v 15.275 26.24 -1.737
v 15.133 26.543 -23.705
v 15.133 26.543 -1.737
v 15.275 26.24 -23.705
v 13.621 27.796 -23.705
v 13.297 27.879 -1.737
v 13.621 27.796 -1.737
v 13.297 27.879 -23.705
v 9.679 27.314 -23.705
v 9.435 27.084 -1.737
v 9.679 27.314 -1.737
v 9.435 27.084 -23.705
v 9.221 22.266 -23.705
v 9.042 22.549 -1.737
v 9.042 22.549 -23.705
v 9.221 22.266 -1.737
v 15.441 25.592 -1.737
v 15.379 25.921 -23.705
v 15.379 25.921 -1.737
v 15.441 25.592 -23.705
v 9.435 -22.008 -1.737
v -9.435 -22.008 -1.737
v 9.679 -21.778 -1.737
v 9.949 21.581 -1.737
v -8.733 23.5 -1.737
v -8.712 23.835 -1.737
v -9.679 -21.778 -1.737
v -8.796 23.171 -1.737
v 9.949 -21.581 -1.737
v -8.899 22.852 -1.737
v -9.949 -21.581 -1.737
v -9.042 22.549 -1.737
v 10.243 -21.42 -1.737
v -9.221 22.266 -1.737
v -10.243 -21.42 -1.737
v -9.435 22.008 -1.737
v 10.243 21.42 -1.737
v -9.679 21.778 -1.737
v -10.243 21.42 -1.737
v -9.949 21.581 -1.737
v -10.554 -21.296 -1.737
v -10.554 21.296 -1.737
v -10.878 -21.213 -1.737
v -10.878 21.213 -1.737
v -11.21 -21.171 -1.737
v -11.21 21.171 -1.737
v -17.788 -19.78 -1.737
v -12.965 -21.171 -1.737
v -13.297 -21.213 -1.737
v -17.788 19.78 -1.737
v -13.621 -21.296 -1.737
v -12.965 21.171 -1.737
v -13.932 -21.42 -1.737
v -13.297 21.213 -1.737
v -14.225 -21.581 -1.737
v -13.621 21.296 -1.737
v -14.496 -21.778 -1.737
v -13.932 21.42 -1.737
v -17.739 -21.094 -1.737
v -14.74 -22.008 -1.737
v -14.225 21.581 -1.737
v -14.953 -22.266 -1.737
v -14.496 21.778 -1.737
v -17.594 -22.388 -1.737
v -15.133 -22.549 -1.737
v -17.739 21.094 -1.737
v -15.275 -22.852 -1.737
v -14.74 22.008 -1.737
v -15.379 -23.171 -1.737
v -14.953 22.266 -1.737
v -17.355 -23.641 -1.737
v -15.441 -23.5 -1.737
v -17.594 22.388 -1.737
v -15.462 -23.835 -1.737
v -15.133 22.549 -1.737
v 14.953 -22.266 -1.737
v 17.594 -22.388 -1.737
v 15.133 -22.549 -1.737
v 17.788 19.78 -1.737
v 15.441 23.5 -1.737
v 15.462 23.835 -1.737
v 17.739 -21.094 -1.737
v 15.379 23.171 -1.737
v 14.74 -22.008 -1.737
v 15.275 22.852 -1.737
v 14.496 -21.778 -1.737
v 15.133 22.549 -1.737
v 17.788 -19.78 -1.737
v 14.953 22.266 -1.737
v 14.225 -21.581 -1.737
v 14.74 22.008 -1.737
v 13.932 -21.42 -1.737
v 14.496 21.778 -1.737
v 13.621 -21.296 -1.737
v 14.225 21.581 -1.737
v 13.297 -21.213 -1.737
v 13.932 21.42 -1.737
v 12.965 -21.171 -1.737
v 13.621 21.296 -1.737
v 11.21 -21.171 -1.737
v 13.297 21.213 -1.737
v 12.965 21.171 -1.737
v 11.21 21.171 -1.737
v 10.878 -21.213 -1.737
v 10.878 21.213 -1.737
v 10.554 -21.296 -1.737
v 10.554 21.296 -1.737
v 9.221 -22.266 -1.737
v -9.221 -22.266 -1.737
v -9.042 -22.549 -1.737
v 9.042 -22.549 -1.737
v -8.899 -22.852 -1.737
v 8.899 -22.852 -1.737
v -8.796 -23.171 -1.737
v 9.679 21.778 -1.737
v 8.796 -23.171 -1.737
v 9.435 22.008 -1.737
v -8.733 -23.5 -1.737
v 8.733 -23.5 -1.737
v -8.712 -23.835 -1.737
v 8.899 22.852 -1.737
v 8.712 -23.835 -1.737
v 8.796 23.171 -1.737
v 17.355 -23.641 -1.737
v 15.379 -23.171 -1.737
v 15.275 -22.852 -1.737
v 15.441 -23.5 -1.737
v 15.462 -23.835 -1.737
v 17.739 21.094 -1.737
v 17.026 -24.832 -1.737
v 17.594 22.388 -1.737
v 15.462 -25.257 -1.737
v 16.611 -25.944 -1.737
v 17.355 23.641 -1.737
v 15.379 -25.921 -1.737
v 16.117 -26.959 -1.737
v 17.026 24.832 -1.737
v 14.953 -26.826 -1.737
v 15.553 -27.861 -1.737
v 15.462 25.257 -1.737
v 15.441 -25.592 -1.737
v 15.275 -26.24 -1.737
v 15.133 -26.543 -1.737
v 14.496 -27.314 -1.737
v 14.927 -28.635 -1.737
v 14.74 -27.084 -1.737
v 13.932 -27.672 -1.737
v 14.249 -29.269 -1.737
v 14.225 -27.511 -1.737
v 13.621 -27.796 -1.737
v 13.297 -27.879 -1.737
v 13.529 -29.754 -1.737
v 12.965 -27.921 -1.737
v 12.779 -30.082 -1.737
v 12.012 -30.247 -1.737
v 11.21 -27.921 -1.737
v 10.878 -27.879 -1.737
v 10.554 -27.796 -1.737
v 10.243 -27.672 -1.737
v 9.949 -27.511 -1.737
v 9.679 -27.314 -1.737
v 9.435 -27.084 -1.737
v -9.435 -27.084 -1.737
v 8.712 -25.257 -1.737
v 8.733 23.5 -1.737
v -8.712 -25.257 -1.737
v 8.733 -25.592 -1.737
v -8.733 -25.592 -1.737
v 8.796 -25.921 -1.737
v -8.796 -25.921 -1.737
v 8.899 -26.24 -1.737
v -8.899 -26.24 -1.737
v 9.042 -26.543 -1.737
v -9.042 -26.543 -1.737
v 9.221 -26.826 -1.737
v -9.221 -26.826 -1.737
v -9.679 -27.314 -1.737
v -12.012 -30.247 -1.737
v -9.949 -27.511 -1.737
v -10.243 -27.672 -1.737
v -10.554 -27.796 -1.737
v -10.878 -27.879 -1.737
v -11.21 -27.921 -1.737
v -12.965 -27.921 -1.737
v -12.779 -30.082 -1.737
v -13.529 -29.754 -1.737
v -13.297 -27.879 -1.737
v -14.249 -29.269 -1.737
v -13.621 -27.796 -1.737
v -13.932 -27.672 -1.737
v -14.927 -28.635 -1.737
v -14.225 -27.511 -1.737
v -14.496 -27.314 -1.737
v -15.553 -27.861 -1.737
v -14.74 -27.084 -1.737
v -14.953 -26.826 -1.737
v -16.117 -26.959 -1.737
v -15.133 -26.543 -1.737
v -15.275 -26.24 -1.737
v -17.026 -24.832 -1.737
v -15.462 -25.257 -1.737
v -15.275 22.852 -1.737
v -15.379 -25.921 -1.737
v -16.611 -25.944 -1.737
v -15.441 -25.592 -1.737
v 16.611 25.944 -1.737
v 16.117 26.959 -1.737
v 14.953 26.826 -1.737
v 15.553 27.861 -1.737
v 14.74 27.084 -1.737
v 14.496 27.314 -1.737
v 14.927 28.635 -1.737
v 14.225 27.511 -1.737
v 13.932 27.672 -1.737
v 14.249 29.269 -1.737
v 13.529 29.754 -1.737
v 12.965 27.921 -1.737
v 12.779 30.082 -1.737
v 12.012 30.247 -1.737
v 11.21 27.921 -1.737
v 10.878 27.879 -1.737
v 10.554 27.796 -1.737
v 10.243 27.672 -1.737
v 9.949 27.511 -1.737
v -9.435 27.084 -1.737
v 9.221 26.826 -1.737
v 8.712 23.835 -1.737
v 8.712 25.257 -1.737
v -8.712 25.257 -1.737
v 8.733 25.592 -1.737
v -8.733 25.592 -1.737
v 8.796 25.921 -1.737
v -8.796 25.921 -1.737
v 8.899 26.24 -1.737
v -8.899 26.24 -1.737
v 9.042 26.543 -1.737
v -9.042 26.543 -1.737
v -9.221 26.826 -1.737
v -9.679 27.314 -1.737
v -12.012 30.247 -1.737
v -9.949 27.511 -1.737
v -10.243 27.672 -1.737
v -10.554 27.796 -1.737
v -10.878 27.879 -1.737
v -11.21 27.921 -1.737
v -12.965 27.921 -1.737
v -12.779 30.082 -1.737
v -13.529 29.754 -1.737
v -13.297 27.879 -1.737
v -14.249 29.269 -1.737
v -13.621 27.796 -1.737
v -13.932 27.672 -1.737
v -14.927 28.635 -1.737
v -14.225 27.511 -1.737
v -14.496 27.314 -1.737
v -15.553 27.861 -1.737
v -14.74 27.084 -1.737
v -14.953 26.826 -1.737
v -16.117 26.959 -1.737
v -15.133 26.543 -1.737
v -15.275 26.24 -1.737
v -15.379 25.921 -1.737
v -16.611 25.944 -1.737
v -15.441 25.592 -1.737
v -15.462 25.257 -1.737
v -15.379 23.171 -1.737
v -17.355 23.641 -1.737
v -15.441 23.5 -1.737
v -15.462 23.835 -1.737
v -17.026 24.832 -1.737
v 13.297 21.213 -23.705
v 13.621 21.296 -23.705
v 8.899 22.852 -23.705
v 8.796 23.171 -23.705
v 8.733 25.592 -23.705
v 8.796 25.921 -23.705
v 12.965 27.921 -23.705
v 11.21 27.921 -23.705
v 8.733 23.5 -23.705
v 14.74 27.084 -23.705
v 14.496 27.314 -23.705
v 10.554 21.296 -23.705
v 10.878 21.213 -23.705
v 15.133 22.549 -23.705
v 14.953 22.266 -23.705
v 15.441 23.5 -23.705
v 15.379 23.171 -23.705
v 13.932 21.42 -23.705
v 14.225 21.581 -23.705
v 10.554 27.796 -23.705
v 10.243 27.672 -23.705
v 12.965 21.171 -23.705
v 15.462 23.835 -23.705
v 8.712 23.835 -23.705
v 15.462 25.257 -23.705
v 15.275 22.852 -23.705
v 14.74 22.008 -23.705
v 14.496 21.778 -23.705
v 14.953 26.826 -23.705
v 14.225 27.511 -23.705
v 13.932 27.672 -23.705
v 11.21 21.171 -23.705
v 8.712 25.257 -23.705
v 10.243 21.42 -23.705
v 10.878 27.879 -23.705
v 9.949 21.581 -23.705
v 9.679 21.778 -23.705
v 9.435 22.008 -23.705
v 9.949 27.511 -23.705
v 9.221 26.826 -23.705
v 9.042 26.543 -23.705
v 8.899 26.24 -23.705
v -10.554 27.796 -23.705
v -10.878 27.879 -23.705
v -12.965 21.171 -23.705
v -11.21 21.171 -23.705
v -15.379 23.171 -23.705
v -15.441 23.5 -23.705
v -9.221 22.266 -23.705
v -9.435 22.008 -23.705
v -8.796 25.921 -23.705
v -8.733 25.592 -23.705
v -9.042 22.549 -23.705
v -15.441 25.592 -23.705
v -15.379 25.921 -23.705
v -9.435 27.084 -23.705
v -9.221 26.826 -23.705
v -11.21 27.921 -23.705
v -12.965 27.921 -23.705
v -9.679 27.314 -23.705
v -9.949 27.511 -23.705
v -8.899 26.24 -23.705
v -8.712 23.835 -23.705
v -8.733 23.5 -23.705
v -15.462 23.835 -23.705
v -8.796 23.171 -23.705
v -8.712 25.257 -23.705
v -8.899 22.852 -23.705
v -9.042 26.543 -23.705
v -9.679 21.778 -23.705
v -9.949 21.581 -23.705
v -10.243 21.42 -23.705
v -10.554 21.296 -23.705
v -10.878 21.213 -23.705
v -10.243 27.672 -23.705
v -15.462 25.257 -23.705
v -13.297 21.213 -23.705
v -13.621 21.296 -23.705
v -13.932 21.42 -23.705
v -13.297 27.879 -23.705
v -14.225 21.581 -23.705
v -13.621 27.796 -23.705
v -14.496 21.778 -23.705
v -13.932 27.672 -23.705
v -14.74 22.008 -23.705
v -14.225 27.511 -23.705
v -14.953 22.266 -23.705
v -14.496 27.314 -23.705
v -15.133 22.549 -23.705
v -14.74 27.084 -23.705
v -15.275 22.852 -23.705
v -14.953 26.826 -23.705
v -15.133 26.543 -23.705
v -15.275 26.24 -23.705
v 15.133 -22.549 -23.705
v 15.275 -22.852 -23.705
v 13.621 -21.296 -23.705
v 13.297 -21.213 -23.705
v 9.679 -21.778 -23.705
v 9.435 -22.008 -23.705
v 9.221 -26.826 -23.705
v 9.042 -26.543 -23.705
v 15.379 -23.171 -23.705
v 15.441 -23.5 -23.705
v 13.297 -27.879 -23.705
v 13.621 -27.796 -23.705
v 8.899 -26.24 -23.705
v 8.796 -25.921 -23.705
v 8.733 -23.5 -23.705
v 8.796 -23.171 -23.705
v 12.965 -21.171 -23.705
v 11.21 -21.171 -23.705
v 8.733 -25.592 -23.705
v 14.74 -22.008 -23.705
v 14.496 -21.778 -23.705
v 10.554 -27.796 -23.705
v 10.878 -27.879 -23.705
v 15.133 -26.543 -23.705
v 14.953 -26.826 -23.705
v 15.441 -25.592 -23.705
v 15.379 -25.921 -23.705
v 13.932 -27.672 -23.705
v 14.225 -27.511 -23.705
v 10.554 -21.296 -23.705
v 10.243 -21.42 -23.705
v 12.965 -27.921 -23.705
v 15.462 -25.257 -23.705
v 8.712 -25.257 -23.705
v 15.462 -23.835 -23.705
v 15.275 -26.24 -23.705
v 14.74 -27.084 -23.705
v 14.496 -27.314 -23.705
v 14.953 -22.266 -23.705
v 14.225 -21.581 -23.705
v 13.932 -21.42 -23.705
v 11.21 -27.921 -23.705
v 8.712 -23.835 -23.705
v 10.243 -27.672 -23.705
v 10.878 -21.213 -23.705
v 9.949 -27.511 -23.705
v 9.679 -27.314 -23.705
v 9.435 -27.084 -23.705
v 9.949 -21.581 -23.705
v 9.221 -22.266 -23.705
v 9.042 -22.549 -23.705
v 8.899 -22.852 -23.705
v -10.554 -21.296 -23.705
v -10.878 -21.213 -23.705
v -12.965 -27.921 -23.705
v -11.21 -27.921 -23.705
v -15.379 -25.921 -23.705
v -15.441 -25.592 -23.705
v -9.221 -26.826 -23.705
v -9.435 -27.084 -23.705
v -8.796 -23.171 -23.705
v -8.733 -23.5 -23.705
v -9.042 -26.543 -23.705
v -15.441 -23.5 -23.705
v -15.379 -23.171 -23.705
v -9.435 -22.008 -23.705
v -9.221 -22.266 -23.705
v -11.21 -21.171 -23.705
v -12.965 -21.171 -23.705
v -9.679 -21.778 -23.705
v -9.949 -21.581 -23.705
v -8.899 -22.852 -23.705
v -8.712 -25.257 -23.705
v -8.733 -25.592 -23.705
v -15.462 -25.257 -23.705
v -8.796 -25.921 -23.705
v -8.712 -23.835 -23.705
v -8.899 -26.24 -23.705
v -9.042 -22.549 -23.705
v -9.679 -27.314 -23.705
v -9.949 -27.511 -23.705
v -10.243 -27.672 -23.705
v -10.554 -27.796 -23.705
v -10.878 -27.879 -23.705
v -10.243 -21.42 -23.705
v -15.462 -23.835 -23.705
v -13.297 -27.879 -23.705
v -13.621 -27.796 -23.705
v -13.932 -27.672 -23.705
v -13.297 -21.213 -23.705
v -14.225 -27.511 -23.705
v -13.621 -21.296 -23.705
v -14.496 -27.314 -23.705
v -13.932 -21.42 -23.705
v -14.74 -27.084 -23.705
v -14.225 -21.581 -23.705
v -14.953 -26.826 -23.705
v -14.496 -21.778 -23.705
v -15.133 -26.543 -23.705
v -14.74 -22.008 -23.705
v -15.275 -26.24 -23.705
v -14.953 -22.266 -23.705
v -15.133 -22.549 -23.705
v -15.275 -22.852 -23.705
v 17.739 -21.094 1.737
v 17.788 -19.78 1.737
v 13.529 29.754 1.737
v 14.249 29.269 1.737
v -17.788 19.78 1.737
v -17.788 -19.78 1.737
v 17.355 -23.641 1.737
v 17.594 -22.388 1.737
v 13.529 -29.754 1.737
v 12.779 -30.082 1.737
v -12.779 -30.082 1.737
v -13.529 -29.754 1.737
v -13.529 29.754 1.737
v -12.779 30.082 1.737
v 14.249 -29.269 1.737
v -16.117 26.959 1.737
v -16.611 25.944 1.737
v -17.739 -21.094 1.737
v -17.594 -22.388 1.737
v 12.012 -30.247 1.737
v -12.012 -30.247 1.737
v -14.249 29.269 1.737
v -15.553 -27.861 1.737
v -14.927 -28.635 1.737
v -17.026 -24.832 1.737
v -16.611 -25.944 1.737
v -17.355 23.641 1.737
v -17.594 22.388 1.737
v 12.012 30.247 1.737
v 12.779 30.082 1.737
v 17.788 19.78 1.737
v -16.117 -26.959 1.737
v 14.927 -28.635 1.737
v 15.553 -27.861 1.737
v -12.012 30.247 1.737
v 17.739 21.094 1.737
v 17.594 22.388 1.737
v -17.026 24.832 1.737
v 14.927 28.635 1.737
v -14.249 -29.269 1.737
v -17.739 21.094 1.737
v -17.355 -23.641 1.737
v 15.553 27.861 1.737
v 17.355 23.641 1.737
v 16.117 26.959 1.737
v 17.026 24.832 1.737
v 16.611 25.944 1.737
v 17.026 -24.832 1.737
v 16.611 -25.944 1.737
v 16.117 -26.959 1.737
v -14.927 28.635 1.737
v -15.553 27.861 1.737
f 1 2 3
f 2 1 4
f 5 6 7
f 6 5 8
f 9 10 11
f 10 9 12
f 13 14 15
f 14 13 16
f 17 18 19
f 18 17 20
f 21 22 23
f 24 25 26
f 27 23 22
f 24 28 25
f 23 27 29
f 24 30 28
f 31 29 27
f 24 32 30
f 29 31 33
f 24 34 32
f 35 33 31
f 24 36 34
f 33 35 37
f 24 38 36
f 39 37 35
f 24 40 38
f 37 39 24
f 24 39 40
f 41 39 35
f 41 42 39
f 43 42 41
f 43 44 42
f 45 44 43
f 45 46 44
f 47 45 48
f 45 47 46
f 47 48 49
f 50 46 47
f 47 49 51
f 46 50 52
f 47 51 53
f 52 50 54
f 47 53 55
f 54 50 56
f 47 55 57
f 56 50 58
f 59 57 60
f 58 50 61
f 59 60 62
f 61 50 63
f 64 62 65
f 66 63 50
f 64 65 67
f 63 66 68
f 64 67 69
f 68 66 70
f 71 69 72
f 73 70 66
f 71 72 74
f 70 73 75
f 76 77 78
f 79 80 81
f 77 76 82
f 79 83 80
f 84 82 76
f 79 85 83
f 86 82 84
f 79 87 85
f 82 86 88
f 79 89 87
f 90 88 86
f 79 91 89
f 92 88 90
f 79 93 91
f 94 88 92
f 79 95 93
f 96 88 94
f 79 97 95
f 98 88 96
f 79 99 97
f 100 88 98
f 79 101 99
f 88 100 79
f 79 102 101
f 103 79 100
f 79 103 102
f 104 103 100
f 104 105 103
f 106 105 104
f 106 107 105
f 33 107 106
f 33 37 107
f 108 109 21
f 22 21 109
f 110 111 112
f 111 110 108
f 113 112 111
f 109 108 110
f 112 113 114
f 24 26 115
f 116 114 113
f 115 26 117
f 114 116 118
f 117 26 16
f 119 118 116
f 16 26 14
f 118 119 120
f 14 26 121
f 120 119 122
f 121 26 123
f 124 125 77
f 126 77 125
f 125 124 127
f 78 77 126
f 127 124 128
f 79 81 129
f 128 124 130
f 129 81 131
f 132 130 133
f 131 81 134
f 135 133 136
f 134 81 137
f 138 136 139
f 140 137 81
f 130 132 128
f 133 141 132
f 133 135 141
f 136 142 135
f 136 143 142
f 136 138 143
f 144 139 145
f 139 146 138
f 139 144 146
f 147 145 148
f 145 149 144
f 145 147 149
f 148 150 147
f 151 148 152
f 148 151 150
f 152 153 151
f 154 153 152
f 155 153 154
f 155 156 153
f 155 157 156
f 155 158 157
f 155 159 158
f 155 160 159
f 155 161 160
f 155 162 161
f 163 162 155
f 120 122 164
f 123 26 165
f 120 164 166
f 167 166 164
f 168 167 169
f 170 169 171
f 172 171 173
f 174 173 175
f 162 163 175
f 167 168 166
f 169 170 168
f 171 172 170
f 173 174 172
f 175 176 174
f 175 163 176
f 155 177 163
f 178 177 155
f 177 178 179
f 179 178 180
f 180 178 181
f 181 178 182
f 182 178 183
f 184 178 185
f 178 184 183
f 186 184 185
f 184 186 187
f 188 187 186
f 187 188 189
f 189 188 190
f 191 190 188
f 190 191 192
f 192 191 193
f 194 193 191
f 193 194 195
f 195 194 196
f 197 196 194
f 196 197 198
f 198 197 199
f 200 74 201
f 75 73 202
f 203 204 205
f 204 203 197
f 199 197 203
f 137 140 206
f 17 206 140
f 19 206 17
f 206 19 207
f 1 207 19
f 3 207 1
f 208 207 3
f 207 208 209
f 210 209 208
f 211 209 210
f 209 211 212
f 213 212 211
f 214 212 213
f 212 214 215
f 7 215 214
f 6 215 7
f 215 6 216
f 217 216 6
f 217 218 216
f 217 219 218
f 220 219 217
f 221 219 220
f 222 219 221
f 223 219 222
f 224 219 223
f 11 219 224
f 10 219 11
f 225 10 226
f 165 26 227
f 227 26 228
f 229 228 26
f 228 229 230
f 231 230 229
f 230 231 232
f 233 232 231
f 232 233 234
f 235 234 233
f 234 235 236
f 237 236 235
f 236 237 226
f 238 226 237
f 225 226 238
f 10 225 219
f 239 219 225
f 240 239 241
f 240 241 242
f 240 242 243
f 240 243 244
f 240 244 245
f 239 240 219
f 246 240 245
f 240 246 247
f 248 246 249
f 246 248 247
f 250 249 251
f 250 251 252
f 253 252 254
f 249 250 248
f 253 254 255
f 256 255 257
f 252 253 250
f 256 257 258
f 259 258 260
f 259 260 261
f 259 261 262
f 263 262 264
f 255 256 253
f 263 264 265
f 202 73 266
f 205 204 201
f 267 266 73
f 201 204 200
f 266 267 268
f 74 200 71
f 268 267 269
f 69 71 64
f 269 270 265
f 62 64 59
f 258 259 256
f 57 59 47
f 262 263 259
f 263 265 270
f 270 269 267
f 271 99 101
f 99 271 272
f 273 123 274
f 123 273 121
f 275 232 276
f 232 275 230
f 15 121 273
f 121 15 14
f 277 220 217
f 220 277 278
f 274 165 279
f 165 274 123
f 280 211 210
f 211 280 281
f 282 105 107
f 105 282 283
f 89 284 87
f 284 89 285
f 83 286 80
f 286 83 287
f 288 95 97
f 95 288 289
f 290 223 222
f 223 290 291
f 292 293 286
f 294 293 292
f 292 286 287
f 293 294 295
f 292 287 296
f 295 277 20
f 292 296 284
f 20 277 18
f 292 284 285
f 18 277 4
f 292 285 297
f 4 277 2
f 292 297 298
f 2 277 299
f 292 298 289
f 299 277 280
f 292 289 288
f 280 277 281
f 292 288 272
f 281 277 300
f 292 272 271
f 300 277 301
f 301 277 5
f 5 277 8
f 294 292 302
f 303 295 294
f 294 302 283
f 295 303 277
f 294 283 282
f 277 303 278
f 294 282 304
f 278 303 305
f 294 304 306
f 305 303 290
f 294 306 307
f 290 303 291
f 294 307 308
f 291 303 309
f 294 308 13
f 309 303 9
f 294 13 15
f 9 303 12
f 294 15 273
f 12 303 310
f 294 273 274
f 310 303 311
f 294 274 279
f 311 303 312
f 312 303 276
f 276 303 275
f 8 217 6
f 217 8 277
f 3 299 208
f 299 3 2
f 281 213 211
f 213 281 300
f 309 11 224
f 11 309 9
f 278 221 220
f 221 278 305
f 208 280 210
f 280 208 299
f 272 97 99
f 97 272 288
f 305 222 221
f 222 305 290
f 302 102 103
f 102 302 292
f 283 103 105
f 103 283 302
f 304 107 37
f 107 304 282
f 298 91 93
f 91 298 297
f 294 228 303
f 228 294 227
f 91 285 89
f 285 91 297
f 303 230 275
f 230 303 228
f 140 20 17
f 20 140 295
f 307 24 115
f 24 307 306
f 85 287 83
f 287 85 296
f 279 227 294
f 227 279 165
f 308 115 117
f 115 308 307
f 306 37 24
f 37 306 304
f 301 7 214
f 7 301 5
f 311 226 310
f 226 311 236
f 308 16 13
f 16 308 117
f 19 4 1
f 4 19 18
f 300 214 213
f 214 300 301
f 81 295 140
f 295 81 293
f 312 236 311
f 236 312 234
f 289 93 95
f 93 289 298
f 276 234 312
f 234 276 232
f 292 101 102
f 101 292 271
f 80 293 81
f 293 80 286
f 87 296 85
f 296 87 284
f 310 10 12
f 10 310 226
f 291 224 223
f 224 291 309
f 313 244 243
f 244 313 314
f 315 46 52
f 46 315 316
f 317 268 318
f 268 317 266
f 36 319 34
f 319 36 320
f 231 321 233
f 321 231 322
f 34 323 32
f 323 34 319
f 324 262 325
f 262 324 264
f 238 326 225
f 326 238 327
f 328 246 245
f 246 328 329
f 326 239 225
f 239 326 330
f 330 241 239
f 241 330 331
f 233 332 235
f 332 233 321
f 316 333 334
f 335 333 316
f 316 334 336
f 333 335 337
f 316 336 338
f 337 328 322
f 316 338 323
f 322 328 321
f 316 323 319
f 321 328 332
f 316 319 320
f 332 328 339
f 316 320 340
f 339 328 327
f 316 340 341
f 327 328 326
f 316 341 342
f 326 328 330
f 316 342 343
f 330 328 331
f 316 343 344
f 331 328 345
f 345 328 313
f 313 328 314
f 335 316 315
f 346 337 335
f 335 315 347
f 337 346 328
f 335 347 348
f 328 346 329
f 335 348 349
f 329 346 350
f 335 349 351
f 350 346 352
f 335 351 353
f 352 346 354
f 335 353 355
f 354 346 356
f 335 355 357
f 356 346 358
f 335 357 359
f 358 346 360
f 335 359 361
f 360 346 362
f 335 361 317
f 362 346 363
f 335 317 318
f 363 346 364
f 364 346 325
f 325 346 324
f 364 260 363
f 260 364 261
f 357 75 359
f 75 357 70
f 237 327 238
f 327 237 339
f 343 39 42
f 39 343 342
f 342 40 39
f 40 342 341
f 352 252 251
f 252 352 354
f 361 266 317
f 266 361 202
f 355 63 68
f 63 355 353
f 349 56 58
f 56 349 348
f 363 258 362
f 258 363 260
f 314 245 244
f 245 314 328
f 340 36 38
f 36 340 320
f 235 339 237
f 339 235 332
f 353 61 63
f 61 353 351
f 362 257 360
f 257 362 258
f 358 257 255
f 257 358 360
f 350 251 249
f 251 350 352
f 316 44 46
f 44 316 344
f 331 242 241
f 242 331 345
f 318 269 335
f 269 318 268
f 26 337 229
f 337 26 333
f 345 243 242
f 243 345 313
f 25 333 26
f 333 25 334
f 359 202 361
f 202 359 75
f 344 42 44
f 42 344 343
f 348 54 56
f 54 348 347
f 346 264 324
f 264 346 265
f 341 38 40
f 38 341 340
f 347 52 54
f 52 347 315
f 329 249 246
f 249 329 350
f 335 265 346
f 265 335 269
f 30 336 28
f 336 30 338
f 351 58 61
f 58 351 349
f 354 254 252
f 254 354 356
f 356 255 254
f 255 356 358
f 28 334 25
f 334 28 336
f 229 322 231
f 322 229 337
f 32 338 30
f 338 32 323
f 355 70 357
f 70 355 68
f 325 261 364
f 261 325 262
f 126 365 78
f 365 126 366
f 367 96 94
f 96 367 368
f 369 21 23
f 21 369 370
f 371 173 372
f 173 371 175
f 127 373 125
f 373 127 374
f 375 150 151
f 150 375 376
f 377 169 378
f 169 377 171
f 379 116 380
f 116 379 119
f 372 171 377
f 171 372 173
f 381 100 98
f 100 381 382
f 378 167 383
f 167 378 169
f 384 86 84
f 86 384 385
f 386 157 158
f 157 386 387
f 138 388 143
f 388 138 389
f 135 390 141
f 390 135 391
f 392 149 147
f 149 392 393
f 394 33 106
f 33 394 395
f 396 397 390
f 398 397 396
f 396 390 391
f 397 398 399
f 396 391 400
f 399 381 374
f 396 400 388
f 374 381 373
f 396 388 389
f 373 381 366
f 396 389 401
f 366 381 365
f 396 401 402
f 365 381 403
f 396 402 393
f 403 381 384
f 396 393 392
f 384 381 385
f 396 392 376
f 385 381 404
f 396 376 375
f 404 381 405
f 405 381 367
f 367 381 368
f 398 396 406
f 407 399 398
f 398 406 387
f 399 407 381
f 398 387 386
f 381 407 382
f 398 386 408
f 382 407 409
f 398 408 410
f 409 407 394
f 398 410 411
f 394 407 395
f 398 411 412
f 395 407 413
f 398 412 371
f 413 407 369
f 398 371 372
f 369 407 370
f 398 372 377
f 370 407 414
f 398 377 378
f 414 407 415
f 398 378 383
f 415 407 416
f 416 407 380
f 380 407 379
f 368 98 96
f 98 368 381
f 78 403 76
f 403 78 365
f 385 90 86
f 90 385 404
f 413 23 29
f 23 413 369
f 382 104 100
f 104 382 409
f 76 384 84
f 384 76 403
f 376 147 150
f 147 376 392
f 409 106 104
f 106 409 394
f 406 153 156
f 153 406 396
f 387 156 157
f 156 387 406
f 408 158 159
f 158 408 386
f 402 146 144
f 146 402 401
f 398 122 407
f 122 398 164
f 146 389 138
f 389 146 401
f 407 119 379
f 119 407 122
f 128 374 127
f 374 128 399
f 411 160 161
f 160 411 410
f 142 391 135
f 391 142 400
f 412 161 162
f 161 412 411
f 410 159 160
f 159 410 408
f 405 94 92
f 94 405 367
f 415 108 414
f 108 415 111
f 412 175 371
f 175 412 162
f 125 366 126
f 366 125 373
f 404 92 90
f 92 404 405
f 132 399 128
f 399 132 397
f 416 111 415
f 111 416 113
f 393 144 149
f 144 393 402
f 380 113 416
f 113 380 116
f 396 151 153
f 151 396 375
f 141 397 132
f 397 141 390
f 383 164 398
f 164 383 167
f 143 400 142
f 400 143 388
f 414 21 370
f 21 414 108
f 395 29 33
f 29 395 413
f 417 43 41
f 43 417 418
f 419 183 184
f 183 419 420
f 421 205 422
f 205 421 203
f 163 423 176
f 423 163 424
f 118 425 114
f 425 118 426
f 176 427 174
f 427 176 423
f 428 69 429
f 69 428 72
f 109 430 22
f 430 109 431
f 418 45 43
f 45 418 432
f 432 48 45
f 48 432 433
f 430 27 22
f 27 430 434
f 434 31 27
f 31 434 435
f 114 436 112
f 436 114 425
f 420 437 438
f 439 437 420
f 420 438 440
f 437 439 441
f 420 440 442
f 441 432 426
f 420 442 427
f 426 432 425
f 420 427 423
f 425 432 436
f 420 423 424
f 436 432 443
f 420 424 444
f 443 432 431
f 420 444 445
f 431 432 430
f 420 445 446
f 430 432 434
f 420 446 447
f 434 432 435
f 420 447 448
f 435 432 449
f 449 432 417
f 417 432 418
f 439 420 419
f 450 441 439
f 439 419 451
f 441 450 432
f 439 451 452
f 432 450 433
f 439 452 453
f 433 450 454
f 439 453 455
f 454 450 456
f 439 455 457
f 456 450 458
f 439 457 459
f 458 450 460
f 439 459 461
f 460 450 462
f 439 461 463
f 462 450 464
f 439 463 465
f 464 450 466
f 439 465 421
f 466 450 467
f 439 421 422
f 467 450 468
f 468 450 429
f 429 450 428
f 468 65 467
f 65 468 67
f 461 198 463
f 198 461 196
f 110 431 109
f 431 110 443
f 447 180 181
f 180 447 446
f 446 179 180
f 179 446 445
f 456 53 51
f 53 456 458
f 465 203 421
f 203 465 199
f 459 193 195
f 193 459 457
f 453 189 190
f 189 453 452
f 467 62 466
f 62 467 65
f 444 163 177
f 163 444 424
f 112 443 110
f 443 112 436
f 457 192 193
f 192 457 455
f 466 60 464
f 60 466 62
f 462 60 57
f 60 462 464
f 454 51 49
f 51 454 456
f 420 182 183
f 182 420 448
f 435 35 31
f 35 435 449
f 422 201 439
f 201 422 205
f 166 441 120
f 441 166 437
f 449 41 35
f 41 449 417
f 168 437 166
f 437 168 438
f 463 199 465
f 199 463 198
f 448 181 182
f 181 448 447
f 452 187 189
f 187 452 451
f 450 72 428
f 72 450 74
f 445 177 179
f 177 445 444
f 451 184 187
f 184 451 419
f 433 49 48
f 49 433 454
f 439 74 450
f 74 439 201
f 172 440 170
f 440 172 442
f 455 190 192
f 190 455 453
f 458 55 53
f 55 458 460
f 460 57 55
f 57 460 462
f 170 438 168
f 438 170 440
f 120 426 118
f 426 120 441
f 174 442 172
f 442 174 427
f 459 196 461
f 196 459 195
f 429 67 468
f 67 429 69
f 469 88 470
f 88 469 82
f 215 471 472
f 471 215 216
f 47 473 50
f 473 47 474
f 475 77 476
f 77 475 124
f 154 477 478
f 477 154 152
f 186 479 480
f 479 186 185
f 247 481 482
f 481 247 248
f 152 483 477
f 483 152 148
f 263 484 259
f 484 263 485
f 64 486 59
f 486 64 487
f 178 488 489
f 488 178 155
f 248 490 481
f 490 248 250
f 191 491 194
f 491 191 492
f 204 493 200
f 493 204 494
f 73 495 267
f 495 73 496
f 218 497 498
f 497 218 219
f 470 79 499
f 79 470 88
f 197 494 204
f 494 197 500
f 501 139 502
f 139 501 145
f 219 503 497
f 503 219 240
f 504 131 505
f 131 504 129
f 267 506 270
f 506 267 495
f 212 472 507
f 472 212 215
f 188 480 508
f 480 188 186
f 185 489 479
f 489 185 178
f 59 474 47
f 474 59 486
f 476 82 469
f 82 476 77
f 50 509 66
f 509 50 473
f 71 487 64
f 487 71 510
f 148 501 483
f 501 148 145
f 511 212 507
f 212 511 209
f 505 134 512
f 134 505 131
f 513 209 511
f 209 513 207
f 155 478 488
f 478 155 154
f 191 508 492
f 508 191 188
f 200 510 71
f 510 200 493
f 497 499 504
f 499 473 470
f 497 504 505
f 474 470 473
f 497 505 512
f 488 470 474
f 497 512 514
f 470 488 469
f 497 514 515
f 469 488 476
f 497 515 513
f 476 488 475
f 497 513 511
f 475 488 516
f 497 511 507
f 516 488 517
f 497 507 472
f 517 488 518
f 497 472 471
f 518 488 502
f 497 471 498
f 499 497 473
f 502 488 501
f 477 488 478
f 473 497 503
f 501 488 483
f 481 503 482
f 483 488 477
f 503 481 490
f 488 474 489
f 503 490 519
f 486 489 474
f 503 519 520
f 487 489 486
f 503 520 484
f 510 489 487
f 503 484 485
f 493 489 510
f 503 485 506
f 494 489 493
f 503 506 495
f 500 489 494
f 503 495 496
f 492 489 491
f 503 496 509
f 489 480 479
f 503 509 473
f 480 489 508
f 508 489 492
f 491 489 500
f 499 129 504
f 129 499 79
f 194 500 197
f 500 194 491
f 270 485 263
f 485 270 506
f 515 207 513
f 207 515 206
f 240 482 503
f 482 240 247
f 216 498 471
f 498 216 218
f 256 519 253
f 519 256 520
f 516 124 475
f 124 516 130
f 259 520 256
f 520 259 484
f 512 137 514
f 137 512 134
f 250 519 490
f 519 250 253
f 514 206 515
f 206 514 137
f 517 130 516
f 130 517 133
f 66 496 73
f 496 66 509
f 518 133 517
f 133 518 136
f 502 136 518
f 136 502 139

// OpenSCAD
$fn=50;
module curveSquare(radius) {
    minkowski() {
        cube([10, 10, 1],center=true);
        cylinder(h=1,r=radius,center=true);
    }
}
module squareTable(legHeight, legWidth, legRadius, legOffset, tableSizeX, tableRatioY, tableHeight, tableRadius) {
    tableSizeY = tableSizeX*tableRatioY;
    translate([((tableSizeX-legWidth-tableRadius)/2-legOffset), ((tableSizeY-legWidth-tableRadius)/2-legOffset), -(legHeight+tableHeight)/2]) resize([legWidth, legWidth, legHeight]) curveSquare(legRadius);
    translate([-((tableSizeX-legWidth-tableRadius)/2-legOffset), ((tableSizeY-legWidth-tableRadius)/2-legOffset), -(legHeight+tableHeight)/2]) resize([legWidth, legWidth, legHeight]) curveSquare(legRadius);
    translate([((tableSizeX-legWidth-tableRadius)/2-legOffset), -((tableSizeY-legWidth-tableRadius)/2-legOffset), -(legHeight+tableHeight)/2]) resize([legWidth, legWidth, legHeight]) curveSquare(legRadius);
    translate([-((tableSizeX-legWidth-tableRadius)/2-legOffset), -((tableSizeY-legWidth-tableRadius)/2-legOffset), -(legHeight+tableHeight)/2]) resize([legWidth, legWidth, legHeight]) curveSquare(legRadius);
    resize([tableSizeX, tableSizeY, tableHeight]) curveSquare(tableRadius);
}
module circularTable(legHeight, legWidth, legRadius, legNum, legOffset, tableRadius, tableHeight) {
    for(i=[0:360/legNum:360]) {
        rotate([0, 0, i]) translate([tableRadius-legWidth/2-legOffset, 0, -(legHeight+tableHeight)/2]) resize([legWidth, legWidth, legHeight]) curveSquare(legRadius);
    }
    cylinder(h=tableHeight, r=tableRadius, center=true);
}
//circularTable(rands(10,30,1)[0], rands(2,7,1)[0], rands(0,20,1)[0], floor(rands(4,10,1)[0]), rands(1,4,1)[0], rands(10,40,1)[0], rands(2,5,1)[0]);
squareTable(rands(10,30,1)[0], rands(2,7,1)[0], rands(0,20,1)[0], floor(rands(1,2,1)[0]), rands(15,40,1)[0], rands(0.5,2,1)[0], rands(0,10,1)[0], rands(2,5,1)[0]);
